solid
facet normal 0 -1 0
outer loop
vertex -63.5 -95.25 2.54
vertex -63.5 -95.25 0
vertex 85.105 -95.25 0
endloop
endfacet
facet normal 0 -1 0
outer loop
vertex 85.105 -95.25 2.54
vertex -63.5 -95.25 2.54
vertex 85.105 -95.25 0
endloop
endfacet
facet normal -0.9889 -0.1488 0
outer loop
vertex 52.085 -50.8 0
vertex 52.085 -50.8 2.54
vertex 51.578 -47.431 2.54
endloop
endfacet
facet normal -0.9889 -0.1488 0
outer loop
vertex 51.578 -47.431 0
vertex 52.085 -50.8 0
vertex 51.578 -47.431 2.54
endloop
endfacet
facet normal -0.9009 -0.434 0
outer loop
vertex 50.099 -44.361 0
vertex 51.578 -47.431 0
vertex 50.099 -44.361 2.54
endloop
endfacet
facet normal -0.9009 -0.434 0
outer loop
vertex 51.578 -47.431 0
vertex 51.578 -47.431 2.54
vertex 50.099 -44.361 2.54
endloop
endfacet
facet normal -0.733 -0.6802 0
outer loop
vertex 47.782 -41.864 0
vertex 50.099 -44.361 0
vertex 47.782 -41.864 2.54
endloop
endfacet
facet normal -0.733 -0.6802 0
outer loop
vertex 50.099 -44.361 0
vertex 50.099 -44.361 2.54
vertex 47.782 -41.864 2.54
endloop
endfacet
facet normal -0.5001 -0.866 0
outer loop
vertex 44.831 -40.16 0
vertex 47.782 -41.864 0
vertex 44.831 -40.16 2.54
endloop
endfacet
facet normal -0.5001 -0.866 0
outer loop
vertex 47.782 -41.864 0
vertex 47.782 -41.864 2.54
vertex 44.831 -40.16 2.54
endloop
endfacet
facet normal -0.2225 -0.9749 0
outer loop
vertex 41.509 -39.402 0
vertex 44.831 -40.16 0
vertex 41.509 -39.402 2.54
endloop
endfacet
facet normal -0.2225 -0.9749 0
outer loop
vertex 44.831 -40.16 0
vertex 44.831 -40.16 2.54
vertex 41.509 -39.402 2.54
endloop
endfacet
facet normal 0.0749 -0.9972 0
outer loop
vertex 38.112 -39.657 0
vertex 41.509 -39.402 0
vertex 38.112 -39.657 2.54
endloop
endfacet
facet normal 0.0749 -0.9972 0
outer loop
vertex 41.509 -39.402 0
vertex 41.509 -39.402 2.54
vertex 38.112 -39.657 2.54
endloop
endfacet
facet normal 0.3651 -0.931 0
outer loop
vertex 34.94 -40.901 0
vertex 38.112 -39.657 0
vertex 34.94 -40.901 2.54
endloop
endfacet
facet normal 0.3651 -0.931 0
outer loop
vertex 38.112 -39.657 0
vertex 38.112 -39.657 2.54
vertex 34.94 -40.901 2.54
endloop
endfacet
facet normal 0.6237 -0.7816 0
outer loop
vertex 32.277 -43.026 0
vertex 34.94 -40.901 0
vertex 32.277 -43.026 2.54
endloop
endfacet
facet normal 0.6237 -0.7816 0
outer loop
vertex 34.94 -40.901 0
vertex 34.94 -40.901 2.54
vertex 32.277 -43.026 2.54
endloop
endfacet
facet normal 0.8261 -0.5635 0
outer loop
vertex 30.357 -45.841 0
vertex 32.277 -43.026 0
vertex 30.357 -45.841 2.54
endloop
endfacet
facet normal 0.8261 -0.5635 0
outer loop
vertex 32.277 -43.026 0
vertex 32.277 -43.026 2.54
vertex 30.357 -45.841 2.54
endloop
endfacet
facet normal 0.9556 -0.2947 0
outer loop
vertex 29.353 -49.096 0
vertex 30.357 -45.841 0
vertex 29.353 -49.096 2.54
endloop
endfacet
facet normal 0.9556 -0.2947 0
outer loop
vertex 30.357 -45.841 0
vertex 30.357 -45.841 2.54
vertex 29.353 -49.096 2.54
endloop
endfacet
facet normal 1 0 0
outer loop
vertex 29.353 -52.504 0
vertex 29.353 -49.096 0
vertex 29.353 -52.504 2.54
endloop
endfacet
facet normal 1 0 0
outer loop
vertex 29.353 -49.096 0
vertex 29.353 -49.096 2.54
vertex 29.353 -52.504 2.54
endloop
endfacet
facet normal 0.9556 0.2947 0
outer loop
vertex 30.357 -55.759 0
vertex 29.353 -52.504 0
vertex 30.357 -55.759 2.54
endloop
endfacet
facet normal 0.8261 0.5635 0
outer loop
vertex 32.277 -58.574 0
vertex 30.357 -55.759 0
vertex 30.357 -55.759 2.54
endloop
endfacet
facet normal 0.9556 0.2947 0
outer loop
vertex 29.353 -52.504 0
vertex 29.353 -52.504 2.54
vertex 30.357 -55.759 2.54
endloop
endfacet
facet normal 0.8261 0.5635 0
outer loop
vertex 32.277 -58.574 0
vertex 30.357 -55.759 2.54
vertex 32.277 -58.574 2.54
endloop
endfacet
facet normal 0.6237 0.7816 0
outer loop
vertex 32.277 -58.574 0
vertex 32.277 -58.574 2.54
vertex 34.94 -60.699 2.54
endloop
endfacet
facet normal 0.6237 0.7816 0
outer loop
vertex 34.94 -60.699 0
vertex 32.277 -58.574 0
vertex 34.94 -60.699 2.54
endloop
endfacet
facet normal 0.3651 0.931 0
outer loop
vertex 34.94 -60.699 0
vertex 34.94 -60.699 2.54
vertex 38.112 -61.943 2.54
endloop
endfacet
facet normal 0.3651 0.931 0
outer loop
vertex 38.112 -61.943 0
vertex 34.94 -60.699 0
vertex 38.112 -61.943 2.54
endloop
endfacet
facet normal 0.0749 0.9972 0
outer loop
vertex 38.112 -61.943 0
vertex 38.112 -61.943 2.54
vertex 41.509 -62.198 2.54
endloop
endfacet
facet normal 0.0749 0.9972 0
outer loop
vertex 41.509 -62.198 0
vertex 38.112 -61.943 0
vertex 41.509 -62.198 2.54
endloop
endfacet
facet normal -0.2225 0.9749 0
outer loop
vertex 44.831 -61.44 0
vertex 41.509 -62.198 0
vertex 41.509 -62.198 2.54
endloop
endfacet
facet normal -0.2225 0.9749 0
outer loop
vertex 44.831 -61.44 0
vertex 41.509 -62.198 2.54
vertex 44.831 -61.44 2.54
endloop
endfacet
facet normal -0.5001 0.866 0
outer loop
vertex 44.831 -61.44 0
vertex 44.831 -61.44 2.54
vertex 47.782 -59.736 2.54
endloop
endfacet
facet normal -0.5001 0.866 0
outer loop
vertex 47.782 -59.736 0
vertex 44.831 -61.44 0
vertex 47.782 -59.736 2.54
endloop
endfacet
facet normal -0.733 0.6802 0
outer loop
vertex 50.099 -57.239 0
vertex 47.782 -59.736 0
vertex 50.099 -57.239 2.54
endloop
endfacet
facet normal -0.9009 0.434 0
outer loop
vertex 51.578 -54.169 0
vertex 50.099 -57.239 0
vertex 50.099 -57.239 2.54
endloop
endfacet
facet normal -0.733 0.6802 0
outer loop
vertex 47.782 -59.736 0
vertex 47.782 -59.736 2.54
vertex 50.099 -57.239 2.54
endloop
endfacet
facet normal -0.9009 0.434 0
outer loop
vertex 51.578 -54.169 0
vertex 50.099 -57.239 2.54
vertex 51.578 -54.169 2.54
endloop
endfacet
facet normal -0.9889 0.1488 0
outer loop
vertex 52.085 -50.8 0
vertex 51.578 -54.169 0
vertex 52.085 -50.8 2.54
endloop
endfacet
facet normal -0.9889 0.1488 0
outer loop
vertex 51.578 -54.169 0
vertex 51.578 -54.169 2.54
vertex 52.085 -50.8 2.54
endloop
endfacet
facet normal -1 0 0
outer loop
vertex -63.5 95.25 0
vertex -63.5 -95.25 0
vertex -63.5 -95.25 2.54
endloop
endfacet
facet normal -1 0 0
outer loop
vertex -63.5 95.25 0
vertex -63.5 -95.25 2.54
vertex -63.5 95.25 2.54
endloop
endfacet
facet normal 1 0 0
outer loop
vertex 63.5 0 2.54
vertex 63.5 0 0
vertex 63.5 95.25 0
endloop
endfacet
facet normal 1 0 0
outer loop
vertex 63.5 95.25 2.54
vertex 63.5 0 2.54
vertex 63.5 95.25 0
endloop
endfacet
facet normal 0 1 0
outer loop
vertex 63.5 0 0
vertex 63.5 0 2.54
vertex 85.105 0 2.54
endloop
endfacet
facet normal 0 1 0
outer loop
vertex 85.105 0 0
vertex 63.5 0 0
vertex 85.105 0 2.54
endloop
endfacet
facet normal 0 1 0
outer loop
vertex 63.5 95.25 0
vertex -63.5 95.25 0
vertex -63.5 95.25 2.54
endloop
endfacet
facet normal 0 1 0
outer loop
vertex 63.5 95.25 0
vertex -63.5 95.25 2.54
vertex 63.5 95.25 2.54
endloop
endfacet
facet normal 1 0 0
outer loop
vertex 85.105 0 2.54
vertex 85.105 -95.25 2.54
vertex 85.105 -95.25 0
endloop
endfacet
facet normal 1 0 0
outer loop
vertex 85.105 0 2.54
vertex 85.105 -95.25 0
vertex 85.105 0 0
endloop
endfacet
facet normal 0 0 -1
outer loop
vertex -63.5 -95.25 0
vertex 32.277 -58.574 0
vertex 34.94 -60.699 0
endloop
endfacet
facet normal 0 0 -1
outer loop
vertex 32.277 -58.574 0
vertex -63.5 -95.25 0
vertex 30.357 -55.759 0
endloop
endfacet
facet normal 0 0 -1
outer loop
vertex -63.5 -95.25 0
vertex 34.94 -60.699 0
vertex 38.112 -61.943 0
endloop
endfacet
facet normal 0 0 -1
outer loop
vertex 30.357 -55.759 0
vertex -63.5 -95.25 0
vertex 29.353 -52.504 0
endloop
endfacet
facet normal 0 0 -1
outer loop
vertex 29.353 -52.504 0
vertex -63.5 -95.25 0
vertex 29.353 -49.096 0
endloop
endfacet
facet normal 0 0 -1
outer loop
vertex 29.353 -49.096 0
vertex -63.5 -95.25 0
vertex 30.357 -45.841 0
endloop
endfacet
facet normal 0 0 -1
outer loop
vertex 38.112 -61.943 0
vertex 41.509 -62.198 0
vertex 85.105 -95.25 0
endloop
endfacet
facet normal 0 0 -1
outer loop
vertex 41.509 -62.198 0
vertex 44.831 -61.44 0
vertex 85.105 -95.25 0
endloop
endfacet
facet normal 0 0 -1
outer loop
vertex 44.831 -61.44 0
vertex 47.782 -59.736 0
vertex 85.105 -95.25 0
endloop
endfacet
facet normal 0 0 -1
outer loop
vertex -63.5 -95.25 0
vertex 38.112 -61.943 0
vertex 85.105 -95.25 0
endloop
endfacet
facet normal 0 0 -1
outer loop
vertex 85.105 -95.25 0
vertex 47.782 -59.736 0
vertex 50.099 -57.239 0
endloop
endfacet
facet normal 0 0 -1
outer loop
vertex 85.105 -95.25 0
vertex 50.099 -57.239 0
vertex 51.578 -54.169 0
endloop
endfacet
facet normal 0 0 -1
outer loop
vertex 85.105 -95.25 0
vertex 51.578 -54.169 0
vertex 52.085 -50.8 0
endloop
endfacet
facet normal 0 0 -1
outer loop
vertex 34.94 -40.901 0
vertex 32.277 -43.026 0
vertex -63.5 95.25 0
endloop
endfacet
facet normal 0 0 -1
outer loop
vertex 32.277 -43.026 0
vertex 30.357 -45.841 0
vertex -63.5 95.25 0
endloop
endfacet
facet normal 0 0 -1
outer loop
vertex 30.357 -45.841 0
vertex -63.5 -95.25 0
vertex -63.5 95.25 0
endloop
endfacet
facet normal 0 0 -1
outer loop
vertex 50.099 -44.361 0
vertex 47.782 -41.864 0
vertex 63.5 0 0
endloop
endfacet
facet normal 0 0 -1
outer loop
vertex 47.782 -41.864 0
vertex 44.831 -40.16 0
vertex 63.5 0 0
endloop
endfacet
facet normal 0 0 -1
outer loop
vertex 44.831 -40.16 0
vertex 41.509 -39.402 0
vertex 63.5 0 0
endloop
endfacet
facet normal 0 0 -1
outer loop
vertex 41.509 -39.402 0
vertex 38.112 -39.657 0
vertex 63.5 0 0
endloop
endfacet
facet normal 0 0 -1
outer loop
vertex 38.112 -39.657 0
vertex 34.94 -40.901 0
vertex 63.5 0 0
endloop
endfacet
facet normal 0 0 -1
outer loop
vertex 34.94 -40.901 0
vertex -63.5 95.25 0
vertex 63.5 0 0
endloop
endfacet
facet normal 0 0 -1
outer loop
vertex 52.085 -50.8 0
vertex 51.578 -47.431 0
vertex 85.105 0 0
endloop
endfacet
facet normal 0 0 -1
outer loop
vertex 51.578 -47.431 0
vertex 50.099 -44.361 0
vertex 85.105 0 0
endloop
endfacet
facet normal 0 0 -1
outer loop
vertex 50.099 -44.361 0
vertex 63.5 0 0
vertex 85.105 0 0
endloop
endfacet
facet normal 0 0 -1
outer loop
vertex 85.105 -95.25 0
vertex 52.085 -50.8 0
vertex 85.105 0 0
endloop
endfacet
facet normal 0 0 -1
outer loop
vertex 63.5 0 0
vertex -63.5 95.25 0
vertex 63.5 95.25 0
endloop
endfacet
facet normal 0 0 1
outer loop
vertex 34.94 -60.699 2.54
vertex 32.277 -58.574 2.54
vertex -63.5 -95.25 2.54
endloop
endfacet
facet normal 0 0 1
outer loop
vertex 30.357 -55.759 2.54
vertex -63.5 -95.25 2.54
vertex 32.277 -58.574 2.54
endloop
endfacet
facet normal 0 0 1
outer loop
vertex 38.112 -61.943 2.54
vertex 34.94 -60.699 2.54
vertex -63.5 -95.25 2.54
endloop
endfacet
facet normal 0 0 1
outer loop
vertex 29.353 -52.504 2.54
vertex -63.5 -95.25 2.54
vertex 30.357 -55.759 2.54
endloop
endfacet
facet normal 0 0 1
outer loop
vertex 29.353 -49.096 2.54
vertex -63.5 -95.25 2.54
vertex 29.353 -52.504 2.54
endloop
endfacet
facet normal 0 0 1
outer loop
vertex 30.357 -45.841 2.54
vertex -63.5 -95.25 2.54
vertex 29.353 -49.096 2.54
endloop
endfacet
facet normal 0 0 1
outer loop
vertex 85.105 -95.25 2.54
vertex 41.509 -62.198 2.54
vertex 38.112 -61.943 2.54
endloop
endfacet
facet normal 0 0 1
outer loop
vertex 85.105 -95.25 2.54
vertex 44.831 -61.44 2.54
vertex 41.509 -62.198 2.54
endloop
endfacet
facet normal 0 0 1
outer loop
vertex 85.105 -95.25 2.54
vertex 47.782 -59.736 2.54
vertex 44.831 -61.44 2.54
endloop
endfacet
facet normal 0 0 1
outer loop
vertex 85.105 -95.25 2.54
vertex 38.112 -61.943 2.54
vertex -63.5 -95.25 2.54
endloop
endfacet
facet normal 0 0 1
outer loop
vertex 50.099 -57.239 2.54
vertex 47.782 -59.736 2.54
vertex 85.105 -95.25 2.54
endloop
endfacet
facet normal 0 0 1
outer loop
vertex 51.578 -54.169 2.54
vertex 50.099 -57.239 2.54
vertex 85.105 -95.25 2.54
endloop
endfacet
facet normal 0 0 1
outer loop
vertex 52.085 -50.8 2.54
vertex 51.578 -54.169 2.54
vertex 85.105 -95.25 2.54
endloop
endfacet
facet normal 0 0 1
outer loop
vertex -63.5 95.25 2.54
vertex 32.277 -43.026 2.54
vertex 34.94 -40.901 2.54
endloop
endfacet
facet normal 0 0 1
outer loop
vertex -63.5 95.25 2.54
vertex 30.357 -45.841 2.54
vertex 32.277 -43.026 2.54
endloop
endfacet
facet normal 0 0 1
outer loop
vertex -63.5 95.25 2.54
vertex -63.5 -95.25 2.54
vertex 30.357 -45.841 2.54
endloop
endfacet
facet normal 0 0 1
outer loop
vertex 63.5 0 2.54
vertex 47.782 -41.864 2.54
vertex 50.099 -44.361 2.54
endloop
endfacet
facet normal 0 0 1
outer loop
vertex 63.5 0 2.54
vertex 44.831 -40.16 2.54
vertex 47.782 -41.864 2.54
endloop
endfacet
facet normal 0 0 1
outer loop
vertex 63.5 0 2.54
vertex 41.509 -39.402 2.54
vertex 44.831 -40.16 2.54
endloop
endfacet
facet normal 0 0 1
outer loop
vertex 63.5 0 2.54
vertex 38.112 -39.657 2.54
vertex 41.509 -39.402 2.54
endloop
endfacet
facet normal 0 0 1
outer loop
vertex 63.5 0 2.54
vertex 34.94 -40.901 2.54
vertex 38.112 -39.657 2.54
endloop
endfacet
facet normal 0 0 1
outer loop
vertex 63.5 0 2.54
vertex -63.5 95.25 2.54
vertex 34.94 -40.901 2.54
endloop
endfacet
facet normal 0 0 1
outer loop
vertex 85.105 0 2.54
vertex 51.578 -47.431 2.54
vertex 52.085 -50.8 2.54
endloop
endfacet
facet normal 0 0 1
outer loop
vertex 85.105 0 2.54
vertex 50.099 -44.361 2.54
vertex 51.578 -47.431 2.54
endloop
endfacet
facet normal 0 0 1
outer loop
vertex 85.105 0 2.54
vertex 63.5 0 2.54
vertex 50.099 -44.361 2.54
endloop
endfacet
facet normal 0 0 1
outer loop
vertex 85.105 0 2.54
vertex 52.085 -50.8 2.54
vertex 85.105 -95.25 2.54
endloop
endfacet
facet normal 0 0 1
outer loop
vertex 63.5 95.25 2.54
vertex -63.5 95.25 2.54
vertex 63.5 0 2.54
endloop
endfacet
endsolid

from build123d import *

# Parameters (mm, degrees)
F0_W     = 127
F0_H     = 190.5
F1_DEPTH = 2.54
F2_W     = 21.605315
F2_H     = 95.25
F3_DEPTH = 2.54
F4_R     = 12.7
F5_DEPTH = 101.870598
F6_R     = 12.7
F6_R_2   = 11.43
F7_DEPTH = 2.54


with BuildPart() as f1:
    # F0 (on Top) → F1 (new body)
    with BuildSketch(Plane.XY):
        Rectangle(F0_W, F0_H)
    extrude(amount=F1_DEPTH)

    # F2 (on face) → F3 (join)
    with BuildSketch(Plane.XY.offset(2.54)):
        with Locations((74.302657, -47.625)):
            Rectangle(F2_W, F2_H)
    extrude(amount=-F3_DEPTH)

    # F4 (on face) → F5 (cut)
    with BuildSketch(Plane.XY.offset(2.54)):
        with Locations((40.655315, -50.8)):
            Circle(F4_R)
    extrude(amount=-F5_DEPTH, mode=Mode.SUBTRACT)

    # F6 (on face) → F7 (join)
    with BuildSketch(Plane.XY.offset(2.54)):
        with Locations((40.655315, -50.8)):
            Circle(F6_R)
        with Locations((40.655315, -50.8)):
            Circle(F6_R_2, mode=Mode.SUBTRACT)
    extrude(amount=-F7_DEPTH)


solid = f1.part
